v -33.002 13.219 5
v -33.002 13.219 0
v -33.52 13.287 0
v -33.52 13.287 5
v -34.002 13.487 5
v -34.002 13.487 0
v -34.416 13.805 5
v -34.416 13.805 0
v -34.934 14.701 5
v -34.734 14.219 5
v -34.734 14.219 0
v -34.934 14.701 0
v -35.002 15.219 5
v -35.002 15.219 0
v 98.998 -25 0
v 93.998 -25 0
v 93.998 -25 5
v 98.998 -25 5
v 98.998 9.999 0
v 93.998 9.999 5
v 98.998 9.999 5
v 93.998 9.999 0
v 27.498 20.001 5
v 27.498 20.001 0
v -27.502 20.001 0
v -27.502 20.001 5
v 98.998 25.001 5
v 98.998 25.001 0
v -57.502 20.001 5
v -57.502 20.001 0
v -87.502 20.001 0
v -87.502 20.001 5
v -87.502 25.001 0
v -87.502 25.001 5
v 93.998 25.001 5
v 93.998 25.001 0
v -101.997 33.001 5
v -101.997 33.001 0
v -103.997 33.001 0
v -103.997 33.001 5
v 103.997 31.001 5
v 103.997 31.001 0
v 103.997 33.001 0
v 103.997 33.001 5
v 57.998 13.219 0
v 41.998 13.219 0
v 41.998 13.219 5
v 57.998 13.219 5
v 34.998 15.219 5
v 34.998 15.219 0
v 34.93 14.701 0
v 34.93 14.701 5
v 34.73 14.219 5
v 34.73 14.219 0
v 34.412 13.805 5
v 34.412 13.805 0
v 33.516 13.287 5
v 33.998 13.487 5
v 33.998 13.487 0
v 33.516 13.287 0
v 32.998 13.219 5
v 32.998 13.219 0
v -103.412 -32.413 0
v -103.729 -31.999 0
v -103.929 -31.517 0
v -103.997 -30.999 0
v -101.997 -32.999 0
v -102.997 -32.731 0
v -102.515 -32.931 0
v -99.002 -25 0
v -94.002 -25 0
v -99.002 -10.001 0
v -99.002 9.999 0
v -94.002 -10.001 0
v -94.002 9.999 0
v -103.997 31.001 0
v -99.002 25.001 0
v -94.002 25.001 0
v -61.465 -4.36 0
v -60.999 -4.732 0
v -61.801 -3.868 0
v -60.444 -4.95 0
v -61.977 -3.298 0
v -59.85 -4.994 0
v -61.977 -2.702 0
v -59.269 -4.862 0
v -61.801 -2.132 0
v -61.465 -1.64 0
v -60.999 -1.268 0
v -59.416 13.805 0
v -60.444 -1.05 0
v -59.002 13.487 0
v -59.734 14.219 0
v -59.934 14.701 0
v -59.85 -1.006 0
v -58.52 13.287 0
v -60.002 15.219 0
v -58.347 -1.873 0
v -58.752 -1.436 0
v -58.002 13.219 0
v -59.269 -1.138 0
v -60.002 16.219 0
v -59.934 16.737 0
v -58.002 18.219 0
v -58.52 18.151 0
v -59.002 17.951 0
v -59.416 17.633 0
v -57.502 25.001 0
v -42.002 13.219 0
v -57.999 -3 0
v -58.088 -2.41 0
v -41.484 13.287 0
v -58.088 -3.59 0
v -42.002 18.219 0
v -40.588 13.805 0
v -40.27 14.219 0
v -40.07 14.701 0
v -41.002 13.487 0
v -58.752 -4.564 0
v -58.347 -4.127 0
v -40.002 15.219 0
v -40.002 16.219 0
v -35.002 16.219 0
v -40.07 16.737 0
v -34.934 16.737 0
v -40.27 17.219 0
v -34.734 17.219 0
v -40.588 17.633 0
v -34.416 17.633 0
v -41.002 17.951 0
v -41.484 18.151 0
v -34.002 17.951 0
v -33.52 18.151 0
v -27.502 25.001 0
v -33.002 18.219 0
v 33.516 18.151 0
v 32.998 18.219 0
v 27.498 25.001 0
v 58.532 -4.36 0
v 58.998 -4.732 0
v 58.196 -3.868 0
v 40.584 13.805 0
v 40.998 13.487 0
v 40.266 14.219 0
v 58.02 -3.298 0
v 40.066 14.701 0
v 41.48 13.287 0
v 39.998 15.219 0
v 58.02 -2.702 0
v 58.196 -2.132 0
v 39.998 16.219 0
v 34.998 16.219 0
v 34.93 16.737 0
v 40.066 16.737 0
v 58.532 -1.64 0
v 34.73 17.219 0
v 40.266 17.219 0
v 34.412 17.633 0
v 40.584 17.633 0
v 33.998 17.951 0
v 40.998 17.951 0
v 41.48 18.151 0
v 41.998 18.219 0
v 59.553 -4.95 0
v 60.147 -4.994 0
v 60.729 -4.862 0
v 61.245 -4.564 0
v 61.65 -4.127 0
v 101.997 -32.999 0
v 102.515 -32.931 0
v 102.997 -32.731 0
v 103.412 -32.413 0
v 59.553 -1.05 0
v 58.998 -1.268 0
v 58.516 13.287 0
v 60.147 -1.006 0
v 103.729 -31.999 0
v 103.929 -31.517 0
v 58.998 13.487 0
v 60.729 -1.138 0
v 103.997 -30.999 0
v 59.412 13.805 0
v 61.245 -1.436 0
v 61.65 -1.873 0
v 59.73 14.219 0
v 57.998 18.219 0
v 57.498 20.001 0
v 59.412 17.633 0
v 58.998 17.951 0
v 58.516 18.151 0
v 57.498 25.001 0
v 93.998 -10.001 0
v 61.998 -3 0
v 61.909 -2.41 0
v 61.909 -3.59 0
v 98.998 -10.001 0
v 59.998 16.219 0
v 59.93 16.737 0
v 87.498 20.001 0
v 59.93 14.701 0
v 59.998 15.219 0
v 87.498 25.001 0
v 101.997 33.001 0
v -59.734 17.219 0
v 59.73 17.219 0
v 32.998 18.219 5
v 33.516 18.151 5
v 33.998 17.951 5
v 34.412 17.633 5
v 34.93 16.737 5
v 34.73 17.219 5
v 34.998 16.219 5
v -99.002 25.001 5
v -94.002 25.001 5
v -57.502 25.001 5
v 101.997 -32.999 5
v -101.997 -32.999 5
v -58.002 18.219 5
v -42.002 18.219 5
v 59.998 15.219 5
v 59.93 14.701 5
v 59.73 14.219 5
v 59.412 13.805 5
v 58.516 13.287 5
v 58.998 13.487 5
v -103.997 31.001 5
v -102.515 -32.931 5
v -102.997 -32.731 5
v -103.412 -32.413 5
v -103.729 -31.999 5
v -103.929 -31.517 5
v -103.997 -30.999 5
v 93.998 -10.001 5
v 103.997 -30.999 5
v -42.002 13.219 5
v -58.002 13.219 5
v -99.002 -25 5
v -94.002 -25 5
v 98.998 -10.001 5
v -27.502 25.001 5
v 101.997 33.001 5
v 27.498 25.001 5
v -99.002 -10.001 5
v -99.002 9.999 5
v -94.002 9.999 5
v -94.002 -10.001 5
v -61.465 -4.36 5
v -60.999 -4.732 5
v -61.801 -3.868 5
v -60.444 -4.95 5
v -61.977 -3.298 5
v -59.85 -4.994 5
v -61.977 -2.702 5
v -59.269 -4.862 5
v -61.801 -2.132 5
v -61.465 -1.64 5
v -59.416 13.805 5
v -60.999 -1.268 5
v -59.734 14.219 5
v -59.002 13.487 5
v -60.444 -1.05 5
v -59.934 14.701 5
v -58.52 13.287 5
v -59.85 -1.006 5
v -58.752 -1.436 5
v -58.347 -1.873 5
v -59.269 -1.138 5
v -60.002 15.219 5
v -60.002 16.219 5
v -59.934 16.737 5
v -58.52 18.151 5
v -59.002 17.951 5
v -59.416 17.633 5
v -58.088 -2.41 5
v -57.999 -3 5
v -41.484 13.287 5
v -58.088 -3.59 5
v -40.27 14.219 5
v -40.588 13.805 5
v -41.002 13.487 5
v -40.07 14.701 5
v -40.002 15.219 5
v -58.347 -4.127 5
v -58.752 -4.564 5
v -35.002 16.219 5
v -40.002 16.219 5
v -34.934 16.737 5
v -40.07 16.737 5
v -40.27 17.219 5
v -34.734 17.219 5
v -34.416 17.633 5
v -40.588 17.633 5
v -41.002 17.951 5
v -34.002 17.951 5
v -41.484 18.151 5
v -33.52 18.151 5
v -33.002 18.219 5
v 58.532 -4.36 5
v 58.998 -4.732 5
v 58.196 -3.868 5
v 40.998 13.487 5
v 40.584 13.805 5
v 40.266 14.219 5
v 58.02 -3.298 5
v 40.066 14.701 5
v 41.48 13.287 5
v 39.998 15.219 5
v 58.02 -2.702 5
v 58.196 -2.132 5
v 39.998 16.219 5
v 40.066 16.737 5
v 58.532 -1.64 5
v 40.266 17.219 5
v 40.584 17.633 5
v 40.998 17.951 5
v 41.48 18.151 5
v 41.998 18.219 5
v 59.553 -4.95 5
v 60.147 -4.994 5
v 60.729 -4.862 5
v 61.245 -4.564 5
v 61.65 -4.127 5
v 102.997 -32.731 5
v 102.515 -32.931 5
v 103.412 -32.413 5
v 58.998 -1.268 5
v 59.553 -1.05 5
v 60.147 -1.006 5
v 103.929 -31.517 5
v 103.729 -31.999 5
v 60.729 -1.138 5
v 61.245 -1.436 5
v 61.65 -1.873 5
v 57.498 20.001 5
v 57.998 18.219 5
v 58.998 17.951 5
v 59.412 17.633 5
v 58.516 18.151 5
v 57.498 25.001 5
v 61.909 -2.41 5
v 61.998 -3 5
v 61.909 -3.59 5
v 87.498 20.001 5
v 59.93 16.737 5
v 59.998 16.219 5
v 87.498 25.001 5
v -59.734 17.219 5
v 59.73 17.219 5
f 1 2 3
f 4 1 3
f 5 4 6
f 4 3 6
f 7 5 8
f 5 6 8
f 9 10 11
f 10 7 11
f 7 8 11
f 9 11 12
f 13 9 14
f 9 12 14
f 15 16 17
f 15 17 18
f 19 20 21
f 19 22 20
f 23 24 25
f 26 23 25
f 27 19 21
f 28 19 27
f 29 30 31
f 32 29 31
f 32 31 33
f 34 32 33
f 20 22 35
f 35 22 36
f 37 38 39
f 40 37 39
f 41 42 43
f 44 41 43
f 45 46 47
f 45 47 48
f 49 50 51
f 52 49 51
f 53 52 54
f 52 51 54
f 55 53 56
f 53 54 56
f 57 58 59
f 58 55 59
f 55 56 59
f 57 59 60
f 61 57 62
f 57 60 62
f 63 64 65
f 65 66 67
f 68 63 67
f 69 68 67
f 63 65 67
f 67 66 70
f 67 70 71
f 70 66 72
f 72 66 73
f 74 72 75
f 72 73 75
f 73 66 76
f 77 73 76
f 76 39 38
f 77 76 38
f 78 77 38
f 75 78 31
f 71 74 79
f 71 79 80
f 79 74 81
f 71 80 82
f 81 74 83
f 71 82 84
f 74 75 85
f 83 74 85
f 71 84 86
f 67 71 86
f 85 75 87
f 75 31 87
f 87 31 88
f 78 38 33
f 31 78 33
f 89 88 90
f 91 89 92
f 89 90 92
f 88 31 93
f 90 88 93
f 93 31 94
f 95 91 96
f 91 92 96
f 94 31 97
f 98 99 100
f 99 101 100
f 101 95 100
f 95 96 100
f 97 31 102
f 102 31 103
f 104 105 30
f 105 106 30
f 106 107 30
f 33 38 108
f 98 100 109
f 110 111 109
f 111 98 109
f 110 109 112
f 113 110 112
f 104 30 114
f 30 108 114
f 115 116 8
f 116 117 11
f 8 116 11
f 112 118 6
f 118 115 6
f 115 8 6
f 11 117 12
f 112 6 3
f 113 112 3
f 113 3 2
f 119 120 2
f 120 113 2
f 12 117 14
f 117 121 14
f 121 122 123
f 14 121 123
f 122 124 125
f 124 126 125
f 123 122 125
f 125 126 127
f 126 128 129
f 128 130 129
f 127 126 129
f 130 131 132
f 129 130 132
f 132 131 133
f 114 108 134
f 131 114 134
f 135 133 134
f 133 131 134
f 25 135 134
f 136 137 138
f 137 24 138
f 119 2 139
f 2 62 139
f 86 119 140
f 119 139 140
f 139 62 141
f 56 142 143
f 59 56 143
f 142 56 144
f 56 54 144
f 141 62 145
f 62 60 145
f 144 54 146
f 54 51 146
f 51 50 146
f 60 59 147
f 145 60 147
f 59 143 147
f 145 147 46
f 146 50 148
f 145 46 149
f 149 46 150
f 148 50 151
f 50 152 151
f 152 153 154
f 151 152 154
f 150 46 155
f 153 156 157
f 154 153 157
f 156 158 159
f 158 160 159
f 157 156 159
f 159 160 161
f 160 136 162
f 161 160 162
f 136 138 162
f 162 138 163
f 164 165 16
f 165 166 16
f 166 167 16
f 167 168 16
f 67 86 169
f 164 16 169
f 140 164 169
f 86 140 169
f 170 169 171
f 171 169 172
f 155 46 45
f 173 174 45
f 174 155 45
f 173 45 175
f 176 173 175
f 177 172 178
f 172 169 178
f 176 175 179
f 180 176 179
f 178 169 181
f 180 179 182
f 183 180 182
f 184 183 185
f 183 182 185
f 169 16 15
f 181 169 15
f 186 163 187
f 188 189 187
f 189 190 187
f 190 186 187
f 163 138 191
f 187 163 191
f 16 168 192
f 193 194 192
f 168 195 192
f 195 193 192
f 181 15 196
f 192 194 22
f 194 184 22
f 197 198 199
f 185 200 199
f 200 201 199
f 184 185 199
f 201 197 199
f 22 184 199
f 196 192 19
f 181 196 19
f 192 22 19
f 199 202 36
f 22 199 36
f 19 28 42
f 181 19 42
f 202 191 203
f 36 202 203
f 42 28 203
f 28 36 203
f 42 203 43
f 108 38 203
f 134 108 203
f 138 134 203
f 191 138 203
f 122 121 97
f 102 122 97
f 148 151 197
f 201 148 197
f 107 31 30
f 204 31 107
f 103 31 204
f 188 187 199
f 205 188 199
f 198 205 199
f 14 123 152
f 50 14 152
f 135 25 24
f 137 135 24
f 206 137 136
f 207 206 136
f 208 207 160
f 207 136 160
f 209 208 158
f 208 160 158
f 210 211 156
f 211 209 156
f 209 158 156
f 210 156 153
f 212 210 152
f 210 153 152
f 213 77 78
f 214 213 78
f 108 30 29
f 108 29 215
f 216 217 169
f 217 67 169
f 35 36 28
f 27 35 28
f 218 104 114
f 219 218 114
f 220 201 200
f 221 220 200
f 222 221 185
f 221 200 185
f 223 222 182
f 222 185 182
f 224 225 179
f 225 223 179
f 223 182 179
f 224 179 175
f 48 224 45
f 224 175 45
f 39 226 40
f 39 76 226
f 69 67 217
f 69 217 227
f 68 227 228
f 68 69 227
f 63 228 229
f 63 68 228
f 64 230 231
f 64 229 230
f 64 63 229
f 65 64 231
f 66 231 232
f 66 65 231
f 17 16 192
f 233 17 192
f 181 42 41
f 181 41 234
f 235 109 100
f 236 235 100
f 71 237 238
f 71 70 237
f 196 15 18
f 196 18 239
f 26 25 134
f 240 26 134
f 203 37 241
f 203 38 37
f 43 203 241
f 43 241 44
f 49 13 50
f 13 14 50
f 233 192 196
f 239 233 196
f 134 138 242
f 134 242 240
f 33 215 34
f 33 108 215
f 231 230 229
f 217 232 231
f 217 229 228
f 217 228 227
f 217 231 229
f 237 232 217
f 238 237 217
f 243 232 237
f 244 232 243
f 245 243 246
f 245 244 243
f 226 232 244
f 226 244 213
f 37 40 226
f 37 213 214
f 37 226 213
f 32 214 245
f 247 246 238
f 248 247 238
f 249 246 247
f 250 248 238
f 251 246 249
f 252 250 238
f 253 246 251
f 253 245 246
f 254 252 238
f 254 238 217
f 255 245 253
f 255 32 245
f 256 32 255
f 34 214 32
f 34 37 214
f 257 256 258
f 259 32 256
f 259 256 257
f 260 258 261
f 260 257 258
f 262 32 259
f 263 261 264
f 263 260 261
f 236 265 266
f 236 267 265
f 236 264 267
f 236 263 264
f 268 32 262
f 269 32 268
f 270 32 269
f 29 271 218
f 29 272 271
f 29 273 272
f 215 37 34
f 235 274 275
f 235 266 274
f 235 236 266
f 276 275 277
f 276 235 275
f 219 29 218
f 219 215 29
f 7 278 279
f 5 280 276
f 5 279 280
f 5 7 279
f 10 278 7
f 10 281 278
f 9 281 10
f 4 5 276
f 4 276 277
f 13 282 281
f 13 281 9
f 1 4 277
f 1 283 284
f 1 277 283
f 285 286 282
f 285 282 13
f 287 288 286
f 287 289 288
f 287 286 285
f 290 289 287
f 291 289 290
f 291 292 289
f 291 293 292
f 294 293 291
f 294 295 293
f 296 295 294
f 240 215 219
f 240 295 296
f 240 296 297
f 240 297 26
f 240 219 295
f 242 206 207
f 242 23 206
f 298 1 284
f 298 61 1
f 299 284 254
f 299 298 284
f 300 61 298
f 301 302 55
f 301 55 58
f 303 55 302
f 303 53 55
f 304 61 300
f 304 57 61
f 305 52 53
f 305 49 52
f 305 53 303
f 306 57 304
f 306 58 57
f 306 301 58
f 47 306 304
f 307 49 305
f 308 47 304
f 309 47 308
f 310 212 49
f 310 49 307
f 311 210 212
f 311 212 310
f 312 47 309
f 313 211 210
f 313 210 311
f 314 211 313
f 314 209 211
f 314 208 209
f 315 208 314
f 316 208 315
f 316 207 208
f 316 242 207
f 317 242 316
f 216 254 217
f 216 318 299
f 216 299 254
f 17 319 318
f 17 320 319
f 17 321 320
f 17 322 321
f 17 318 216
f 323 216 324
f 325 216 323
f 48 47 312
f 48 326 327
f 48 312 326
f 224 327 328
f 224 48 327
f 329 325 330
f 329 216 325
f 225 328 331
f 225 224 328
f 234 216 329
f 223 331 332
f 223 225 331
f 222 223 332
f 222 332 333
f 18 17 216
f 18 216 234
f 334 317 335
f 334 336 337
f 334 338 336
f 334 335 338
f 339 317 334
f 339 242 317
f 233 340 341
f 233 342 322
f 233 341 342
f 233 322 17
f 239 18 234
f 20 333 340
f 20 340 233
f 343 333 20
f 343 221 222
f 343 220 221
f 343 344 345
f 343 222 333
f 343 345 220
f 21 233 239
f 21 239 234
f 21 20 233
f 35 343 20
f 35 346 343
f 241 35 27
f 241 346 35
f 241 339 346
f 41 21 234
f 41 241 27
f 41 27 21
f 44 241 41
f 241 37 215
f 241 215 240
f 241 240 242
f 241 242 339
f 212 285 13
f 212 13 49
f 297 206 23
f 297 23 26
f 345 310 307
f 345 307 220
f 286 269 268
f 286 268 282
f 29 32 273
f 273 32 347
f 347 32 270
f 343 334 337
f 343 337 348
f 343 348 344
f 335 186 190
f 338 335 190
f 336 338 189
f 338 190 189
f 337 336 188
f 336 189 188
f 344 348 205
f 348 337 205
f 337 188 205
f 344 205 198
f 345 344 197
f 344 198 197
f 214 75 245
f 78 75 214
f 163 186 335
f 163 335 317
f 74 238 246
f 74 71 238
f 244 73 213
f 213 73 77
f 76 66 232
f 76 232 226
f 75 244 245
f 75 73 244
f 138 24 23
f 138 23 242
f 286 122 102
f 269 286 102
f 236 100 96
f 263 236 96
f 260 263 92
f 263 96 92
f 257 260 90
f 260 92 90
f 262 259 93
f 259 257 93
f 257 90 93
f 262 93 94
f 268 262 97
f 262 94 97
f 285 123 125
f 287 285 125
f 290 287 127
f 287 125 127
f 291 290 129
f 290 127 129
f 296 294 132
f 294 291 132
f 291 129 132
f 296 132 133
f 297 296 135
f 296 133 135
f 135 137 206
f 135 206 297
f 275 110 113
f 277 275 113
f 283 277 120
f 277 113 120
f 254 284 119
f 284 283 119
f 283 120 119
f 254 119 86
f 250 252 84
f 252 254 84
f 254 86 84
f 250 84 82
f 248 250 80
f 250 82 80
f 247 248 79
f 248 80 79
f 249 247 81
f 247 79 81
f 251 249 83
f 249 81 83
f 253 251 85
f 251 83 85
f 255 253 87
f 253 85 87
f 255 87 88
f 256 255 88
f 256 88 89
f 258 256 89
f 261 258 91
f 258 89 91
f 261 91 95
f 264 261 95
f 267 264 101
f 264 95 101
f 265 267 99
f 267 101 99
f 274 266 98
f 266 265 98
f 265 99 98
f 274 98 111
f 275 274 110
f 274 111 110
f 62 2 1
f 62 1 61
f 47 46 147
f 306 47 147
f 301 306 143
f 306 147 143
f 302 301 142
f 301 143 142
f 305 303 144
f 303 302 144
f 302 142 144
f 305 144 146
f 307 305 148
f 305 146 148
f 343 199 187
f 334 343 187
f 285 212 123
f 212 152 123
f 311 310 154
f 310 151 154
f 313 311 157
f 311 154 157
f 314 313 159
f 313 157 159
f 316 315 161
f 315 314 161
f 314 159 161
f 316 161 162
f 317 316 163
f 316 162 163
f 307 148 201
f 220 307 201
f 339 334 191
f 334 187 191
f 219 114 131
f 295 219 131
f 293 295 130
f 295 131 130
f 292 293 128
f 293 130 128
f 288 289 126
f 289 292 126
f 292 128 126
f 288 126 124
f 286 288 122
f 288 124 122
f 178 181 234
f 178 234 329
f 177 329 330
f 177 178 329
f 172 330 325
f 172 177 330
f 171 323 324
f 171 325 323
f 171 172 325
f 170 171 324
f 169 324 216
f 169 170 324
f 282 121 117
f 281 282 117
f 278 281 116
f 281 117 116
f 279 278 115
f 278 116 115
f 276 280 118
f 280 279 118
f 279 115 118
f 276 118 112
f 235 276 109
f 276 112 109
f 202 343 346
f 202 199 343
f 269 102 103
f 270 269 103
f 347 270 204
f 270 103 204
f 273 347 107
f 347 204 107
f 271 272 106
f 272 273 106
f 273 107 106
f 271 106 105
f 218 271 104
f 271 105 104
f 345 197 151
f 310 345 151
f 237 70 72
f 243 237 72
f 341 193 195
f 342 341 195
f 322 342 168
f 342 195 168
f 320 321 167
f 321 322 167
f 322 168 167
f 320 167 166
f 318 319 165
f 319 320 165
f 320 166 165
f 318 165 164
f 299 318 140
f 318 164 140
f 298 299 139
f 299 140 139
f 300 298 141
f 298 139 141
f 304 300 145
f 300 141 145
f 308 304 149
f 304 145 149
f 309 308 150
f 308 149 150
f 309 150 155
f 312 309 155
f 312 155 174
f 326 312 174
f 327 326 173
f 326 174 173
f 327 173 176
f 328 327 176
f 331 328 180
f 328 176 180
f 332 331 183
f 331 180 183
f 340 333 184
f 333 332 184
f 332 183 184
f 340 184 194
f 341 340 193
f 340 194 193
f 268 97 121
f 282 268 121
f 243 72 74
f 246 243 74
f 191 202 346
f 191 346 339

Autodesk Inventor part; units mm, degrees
ref_plane "YZ Plane" through (0, 0, 0) normal (1, 0, 0) x (0, 1, 0)
ref_plane "XZ Plane" through (0, 0, 0) normal (0, 1, 0) x (-1, 0, 0)
ref_plane "XY Plane" through (0, 0, 0) normal (0, 0, 1) x (1, 0, 0)
sketch "Sketch1" plane through (0, 0, 0) normal (0, 0, 1) x (1, 0, 0)
  line L0 (-101.9973, -32.9991) -> (101.9973, -32.9991)
  line L1 (-101.9973, 33.0009) -> (101.9973, 33.0009)
  line L2 (-103.9973, -30.9991) -> (-103.9973, 31.0009)
  line L3 (103.9973, 31.0009) -> (103.9973, -30.9991)
  arc A0 (-103.9973, -30.9991) -> (-101.9973, -32.9991) centre (-101.9973, -30.9991) ccw
  arc A1 (101.9973, -32.9991) -> (103.9973, -30.9991) centre (101.9973, -30.9991) ccw
  line L4 (103.9973, 31.0009) -> (103.9973, 33.0009)
  line L5 (101.9973, 33.0009) -> (103.9973, 33.0009)
  line L6 (-103.9973, 31.0009) -> (-103.9973, 33.0009)
  line L7 (-101.9973, 33.0009) -> (-103.9973, 33.0009)
  line L8 (57.998, 18.2189) -> (41.998, 18.2189)
  line L9 (41.998, 13.2189) -> (57.998, 13.2189)
  line L10 (-58.002, 18.2189) -> (-42.002, 18.2189)
  line L11 (-42.002, 13.2189) -> (-58.002, 13.2189)
  line L12 (32.998, 18.2189) -> (-33.002, 18.2189)
  line L13 (-33.002, 13.2189) -> (32.998, 13.2189)
  arc A2 (34.998, 16.2189) -> (32.998, 18.2189) centre (32.998, 16.2189) ccw
  arc A3 (-35.002, 15.2189) -> (-33.002, 13.2189) centre (-33.002, 15.2189) ccw
  arc A4 (-33.002, 18.2189) -> (-35.002, 16.2189) centre (-33.002, 16.2189) ccw
  arc A5 (-40.002, 16.2189) -> (-42.002, 18.2189) centre (-42.002, 16.2189) ccw
  arc A6 (-42.002, 13.2189) -> (-40.002, 15.2189) centre (-42.002, 15.2189) ccw
  arc A7 (-60.002, 15.2189) -> (-58.002, 13.2189) centre (-58.002, 15.2189) ccw
  arc A8 (-58.002, 18.2189) -> (-60.002, 16.2189) centre (-58.002, 16.2189) ccw
  arc A9 (39.998, 15.2189) -> (41.998, 13.2189) centre (41.998, 15.2189) ccw
  arc A10 (41.998, 18.2189) -> (39.998, 16.2189) centre (41.998, 16.2189) ccw
  arc A11 (59.998, 16.2189) -> (57.998, 18.2189) centre (57.998, 16.2189) ccw
  arc A12 (57.998, 13.2189) -> (59.998, 15.2189) centre (57.998, 15.2189) ccw
  arc A13 (32.998, 13.2189) -> (34.998, 15.2189) centre (32.998, 15.2189) ccw
  line L14 (59.998, 16.2189) -> (39.998, 16.2189)
  line L15 (39.998, 15.2189) -> (59.998, 15.2189)
  line L16 (34.998, 16.2189) -> (-35.002, 16.2189)
  line L17 (-35.002, 15.2189) -> (34.998, 15.2189)
  line L18 (-40.002, 16.2189) -> (-60.002, 16.2189)
  line L19 (-60.002, 15.2189) -> (-40.002, 15.2189)
  circle A14 centre (-59.9992, -3) radius 2
  circle A15 centre (59.9979, -3) radius 2
  line L20 (93.998, -24.9998) -> (93.998, -10.0006)
  line L21 (93.998, -10.0006) -> (98.998, -10.0006)
  line L22 (98.998, -24.9998) -> (98.998, -10.0006)
  line L23 (93.998, -24.9998) -> (98.998, -24.9998)
  line L24 (93.998, 9.9994) -> (93.998, 25.0009)
  line L25 (93.998, 25.0009) -> (98.998, 25.0009)
  line L26 (98.998, 9.9994) -> (98.998, 25.0009)
  line L27 (93.998, 9.9994) -> (98.998, 9.9994)
  line L28 (87.498, 20.0009) -> (57.498, 20.0009)
  line L29 (57.498, 20.0009) -> (57.498, 25.0009)
  line L30 (87.498, 25.0009) -> (57.498, 25.0009)
  line L31 (87.498, 20.0009) -> (87.498, 25.0009)
  line L32 (27.498, 20.0009) -> (-27.502, 20.0009)
  line L33 (-27.502, 20.0009) -> (-27.502, 25.0009)
  line L34 (27.498, 25.0009) -> (-27.502, 25.0009)
  line L35 (27.498, 20.0009) -> (27.498, 25.0009)
  line L36 (-57.502, 20.0009) -> (-87.502, 20.0009)
  line L37 (-87.502, 20.0009) -> (-87.502, 25.0009)
  line L38 (-57.502, 25.0009) -> (-87.502, 25.0009)
  line L39 (-57.502, 20.0009) -> (-57.502, 25.0009)
  line L40 (-99.002, 9.9994) -> (-99.002, 25.0009)
  line L41 (-99.002, 25.0009) -> (-94.002, 25.0009)
  line L42 (-94.002, 9.9994) -> (-94.002, 25.0009)
  line L43 (-99.002, 9.9994) -> (-94.002, 9.9994)
  line L44 (-99.002, -24.9998) -> (-99.002, -10.0006)
  line L45 (-99.002, -10.0006) -> (-94.002, -10.0006)
  line L46 (-94.002, -24.9998) -> (-94.002, -10.0006)
  line L47 (-99.002, -24.9998) -> (-94.002, -24.9998)
  point P0 (-85.2166, -15.942)
  point P1 (-103.9973, -32.9991)
  point P2 (103.9973, -32.9991)
  point P3 (59.998, 18.2189)
  point P4 (59.998, 13.2189)
  point P5 (-60.002, 16.2189)
  point P6 (59.998, 15.2189)
  point P7 (59.9979, -3)
extrude "Extrusion1" add sketch "Sketch1" along normal blind 5
properties part number "case bottom front" material "Nylon, molybdenum disulphide"
